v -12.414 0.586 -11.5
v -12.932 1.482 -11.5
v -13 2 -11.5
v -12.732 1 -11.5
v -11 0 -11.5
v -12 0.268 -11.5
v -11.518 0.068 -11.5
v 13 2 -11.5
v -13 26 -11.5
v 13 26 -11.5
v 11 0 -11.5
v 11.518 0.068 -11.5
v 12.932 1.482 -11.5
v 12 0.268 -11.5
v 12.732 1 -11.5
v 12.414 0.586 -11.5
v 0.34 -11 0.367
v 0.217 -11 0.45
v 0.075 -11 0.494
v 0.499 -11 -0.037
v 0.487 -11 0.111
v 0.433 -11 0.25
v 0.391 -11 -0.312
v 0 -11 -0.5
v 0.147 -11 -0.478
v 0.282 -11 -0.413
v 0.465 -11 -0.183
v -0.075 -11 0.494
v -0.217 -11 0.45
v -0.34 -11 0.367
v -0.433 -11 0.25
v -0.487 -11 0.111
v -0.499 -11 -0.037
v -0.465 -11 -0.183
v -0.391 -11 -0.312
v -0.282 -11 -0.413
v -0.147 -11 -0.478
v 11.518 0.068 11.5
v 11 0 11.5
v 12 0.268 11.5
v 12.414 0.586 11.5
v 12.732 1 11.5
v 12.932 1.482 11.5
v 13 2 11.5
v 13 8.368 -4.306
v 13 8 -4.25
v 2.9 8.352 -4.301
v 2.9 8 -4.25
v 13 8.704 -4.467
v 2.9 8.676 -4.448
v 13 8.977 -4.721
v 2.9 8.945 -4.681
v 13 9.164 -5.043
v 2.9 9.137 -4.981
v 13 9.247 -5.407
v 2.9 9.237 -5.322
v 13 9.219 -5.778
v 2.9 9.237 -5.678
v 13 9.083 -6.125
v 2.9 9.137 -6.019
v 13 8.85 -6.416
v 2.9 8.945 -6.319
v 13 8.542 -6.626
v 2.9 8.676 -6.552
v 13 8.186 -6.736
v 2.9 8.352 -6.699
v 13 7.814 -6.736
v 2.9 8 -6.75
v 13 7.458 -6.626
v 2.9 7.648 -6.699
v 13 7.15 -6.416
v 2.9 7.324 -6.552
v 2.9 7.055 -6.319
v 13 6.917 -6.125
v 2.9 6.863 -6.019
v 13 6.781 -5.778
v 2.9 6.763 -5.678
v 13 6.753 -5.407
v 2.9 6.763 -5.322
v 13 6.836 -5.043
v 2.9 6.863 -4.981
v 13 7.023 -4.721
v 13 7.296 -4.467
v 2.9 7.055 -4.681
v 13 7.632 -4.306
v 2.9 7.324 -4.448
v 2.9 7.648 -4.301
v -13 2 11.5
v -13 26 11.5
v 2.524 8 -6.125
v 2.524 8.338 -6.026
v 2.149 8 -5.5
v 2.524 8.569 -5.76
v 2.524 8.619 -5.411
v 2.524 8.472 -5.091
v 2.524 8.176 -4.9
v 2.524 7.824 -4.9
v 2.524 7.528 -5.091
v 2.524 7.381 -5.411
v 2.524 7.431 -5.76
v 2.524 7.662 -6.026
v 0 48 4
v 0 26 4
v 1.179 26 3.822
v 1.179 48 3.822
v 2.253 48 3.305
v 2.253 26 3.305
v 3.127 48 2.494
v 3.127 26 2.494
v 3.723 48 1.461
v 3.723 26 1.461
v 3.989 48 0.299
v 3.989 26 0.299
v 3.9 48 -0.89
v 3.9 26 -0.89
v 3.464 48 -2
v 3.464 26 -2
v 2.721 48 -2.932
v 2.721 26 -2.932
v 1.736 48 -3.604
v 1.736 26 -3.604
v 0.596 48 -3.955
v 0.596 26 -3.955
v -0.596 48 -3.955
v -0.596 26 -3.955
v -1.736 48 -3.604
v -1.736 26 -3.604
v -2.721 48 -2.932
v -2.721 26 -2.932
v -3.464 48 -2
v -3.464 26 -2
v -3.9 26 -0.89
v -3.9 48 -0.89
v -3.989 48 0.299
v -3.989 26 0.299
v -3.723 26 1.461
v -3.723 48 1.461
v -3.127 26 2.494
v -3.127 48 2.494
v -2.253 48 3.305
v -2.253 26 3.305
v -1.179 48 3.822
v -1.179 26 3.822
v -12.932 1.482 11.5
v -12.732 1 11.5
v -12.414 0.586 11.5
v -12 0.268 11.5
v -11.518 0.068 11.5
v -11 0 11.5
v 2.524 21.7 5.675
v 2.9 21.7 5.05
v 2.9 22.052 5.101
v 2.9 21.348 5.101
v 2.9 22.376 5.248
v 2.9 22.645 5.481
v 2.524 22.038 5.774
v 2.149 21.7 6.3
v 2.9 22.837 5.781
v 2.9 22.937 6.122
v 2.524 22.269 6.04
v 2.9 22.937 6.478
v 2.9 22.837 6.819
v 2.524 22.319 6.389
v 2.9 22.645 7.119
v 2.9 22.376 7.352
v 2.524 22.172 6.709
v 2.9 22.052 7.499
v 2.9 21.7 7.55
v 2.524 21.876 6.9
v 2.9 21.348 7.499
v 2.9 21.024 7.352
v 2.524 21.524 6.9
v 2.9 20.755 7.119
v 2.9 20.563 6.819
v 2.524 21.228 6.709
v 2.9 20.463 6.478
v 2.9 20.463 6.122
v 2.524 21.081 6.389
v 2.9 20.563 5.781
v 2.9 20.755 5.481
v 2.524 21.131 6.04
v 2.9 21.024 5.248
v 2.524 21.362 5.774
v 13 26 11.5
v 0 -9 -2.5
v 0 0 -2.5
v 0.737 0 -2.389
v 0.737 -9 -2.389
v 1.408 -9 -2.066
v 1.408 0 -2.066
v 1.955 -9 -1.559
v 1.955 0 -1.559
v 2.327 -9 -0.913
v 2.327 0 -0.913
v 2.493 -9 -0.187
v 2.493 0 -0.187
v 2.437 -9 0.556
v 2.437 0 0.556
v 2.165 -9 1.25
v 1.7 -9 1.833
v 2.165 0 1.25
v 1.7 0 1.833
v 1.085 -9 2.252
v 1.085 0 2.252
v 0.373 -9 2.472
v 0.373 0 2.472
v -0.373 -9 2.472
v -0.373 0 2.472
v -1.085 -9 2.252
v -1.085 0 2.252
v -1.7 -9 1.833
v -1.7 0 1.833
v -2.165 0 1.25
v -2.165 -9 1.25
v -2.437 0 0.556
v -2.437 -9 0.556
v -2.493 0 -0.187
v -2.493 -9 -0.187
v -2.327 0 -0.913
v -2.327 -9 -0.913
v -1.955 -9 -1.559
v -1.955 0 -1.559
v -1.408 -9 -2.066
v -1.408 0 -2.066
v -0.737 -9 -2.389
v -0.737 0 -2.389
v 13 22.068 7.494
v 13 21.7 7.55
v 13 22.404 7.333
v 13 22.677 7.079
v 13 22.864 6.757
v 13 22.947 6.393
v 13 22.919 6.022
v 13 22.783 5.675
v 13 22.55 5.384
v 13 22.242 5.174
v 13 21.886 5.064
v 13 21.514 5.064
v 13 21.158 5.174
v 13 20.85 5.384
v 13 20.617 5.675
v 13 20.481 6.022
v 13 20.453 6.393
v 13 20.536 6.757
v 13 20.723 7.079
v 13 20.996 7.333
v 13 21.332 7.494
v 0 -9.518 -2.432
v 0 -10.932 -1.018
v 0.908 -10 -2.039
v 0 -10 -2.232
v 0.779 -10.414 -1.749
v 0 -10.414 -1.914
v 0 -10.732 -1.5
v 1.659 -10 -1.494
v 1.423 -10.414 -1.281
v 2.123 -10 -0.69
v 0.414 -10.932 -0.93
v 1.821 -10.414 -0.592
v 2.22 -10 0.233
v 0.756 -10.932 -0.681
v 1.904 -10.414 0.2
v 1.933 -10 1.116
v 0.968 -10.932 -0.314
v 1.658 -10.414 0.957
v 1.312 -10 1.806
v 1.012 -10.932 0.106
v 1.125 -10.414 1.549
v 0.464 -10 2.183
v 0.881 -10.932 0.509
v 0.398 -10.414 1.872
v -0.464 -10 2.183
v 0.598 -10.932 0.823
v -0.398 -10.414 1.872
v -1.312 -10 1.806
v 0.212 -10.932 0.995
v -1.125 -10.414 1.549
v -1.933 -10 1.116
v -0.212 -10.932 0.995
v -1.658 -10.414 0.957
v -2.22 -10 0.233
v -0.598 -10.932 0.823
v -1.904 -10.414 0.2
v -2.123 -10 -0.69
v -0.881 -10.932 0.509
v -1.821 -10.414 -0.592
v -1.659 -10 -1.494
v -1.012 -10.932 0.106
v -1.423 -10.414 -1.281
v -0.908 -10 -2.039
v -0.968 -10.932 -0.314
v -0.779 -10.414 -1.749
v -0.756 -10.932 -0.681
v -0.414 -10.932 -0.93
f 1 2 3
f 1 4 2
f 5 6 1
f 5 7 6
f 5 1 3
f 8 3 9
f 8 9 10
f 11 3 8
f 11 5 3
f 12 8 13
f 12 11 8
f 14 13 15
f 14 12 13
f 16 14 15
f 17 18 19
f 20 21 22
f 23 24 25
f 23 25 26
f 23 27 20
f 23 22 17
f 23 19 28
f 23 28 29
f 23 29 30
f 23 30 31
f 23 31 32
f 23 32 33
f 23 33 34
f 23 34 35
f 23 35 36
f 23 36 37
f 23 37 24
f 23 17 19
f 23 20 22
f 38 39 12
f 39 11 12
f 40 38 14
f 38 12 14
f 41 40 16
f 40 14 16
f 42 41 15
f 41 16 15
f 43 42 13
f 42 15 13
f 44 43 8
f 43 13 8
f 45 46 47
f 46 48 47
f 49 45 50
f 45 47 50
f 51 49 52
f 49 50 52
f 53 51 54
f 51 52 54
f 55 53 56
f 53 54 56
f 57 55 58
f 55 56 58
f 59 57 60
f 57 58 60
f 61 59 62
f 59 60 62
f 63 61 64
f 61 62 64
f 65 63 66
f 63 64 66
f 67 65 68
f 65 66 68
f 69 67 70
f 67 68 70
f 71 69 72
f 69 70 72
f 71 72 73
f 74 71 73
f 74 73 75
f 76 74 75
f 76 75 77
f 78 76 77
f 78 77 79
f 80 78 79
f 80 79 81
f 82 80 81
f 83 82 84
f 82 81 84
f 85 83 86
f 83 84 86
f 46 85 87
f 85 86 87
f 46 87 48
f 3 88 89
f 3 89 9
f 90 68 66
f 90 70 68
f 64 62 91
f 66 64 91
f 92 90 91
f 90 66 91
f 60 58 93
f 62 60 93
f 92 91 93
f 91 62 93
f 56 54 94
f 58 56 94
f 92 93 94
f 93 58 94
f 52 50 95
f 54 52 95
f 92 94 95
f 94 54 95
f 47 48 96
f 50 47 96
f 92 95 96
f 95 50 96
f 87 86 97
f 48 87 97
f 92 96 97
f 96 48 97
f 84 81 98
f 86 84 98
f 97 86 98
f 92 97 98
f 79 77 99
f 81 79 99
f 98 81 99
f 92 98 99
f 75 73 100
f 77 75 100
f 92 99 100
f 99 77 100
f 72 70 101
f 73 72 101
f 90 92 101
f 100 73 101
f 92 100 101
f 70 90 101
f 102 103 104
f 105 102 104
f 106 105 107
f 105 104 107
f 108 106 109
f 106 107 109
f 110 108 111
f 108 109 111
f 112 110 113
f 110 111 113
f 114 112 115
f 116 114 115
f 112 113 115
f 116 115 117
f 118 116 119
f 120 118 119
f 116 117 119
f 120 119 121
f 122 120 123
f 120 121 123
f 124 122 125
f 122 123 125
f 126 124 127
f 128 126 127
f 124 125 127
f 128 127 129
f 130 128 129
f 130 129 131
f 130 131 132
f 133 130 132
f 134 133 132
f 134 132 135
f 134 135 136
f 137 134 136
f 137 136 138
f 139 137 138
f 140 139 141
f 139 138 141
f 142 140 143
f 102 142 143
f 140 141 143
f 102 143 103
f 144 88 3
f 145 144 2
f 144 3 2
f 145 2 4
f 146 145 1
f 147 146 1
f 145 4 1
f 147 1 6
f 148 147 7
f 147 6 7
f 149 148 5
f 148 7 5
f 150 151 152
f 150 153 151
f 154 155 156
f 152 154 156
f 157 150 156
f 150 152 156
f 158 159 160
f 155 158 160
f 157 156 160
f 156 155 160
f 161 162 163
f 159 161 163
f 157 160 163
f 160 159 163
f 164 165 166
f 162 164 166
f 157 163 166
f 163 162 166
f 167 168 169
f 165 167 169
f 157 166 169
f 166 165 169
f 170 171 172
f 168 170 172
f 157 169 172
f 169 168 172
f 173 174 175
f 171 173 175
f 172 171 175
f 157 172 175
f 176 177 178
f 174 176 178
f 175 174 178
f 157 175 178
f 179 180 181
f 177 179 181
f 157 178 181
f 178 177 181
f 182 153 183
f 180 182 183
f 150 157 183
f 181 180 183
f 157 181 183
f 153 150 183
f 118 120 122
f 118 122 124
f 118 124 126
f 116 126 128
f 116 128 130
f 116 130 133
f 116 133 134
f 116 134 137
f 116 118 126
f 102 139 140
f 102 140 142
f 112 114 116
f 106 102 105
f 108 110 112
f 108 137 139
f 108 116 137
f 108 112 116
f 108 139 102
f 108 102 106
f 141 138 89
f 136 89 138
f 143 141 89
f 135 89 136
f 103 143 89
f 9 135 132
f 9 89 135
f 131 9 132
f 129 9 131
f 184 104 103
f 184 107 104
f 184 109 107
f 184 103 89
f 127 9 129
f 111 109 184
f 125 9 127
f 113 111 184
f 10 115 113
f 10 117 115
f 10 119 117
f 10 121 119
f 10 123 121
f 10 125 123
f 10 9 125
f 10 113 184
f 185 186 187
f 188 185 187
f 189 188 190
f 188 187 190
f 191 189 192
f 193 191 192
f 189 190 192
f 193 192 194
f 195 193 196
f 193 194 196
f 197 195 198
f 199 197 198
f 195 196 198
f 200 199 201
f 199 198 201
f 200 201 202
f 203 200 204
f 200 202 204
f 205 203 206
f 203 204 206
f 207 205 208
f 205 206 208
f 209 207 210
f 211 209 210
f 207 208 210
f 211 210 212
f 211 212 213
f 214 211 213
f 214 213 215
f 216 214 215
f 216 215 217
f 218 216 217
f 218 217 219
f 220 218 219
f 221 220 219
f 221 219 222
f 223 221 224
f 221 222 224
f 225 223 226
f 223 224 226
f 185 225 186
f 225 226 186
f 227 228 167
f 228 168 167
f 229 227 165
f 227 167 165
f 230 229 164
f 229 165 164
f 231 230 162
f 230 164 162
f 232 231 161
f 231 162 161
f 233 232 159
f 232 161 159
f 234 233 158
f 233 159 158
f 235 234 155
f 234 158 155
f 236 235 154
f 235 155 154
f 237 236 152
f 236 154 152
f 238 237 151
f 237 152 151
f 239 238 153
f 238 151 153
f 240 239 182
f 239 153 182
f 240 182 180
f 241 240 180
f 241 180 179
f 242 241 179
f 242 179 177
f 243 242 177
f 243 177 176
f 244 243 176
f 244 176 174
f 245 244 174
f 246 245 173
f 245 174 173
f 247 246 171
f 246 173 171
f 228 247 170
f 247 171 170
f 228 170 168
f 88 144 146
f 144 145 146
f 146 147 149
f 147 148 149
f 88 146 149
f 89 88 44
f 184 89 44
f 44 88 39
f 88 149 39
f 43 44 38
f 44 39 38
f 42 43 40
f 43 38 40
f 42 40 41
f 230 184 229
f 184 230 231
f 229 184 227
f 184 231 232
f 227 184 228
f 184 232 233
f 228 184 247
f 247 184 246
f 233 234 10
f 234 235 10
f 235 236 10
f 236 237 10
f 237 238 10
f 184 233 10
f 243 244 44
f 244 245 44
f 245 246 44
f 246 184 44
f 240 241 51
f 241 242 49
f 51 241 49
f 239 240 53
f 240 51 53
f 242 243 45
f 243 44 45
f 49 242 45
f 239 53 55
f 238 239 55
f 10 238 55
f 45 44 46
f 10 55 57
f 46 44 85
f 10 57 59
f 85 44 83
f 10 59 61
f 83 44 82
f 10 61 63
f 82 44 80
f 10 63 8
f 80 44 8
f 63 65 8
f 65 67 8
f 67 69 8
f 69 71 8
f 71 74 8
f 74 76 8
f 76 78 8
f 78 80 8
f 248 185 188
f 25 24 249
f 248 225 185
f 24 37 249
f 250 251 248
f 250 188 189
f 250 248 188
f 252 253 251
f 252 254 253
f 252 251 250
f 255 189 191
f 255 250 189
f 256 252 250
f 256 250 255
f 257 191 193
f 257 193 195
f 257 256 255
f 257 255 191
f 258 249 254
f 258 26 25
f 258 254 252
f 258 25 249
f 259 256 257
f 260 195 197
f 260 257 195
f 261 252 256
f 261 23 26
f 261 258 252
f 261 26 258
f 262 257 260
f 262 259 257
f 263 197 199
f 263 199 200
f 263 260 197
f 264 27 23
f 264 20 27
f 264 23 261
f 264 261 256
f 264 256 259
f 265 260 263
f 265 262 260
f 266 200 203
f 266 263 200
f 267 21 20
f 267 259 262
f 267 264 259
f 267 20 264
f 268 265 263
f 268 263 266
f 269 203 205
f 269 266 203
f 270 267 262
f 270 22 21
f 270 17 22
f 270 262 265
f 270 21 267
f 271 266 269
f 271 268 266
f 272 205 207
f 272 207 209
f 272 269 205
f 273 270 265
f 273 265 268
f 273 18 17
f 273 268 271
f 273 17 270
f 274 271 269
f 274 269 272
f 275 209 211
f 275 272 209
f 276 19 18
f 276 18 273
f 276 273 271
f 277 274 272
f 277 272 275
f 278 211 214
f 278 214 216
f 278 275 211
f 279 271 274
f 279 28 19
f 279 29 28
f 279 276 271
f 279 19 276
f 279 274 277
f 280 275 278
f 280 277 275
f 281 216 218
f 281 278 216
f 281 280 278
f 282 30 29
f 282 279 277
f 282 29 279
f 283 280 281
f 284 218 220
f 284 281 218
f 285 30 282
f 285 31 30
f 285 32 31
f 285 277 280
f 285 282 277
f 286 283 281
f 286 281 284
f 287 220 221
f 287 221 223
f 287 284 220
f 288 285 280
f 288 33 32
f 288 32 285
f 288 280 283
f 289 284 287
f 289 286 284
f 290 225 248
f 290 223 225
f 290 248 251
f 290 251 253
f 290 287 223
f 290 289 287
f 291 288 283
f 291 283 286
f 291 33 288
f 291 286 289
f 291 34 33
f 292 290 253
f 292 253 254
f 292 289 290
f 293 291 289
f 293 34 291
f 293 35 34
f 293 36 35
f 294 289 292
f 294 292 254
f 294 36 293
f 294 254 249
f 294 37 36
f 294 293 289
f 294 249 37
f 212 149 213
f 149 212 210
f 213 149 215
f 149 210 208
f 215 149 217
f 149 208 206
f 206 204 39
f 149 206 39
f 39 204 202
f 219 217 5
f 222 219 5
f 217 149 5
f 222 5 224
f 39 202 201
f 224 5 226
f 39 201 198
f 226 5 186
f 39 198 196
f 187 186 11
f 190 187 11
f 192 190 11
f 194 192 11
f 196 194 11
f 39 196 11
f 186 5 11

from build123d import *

# Parameters (mm, degrees)
SKETCH1_W             = 26
SKETCH1_H             = 23
BOSS_EXTRUDE1_DEPTH   = 26
M3_TAPPED_HOLE1_D     = 2.5
M3_TAPPED_HOLE1_DEPTH = 10.1
M3_TAPPED_HOLE1_TIP   = 0.751075774
FILLET1_R             = 2
SKETCH5_R             = 4
BOSS_EXTRUDE2_DEPTH   = 22
SKETCH6_R             = 2.5
BOSS_EXTRUDE3_DEPTH   = 11
FILLET2_R             = 2


with BuildPart() as part:
    # Sketch1 → Boss-Extrude1 (new body)
    with BuildSketch(Plane(origin=(0, 0, 0), x_dir=(1, 0, 0), z_dir=(0, 1, 0))):
        Rectangle(SKETCH1_W, SKETCH1_H)
    extrude(amount=BOSS_EXTRUDE1_DEPTH)

    # M3 Tapped Hole1
    with Locations(Plane(origin=(13, 0, 0), x_dir=(0, 0, -1), z_dir=(1, 0, 0))):
        with Locations((-6.3, 21.7), (5.5, 8)):
            Hole(M3_TAPPED_HOLE1_D / 2, depth=M3_TAPPED_HOLE1_DEPTH)
            with Locations((0, 0, -(M3_TAPPED_HOLE1_DEPTH + M3_TAPPED_HOLE1_TIP / 2))):  # 118° drill point
                Cone(0, M3_TAPPED_HOLE1_D / 2, M3_TAPPED_HOLE1_TIP, mode=Mode.SUBTRACT)

    # Fillet1
    fillet1_edges = [part.edges().sort_by_distance(p)[0] for p in [
        (-13, 0, 0),
        (13, 0, 0),
    ]]
    fillet(fillet1_edges, radius=FILLET1_R)

    # Sketch5 → Boss-Extrude2 (add)
    with BuildSketch(Plane(origin=(0, 26, 0), x_dir=(1, 0, 0), z_dir=(0, 1, 0))):
        with Locations(Location((0, 0, 0), (0, 0, 270))):
            Circle(SKETCH5_R)
    extrude(amount=BOSS_EXTRUDE2_DEPTH)

    # Sketch6 → Boss-Extrude3 (add)
    with BuildSketch(Plane.XZ):
        with Locations(Location((0, 0, 0), (0, 0, 270))):
            Circle(SKETCH6_R)
    extrude(amount=BOSS_EXTRUDE3_DEPTH)

    # Fillet2
    fillet2_edges = [part.edges().sort_by_distance(p)[0] for p in [
        (0, -11, 2.5),
    ]]
    fillet(fillet2_edges, radius=FILLET2_R)


solid = part.part
